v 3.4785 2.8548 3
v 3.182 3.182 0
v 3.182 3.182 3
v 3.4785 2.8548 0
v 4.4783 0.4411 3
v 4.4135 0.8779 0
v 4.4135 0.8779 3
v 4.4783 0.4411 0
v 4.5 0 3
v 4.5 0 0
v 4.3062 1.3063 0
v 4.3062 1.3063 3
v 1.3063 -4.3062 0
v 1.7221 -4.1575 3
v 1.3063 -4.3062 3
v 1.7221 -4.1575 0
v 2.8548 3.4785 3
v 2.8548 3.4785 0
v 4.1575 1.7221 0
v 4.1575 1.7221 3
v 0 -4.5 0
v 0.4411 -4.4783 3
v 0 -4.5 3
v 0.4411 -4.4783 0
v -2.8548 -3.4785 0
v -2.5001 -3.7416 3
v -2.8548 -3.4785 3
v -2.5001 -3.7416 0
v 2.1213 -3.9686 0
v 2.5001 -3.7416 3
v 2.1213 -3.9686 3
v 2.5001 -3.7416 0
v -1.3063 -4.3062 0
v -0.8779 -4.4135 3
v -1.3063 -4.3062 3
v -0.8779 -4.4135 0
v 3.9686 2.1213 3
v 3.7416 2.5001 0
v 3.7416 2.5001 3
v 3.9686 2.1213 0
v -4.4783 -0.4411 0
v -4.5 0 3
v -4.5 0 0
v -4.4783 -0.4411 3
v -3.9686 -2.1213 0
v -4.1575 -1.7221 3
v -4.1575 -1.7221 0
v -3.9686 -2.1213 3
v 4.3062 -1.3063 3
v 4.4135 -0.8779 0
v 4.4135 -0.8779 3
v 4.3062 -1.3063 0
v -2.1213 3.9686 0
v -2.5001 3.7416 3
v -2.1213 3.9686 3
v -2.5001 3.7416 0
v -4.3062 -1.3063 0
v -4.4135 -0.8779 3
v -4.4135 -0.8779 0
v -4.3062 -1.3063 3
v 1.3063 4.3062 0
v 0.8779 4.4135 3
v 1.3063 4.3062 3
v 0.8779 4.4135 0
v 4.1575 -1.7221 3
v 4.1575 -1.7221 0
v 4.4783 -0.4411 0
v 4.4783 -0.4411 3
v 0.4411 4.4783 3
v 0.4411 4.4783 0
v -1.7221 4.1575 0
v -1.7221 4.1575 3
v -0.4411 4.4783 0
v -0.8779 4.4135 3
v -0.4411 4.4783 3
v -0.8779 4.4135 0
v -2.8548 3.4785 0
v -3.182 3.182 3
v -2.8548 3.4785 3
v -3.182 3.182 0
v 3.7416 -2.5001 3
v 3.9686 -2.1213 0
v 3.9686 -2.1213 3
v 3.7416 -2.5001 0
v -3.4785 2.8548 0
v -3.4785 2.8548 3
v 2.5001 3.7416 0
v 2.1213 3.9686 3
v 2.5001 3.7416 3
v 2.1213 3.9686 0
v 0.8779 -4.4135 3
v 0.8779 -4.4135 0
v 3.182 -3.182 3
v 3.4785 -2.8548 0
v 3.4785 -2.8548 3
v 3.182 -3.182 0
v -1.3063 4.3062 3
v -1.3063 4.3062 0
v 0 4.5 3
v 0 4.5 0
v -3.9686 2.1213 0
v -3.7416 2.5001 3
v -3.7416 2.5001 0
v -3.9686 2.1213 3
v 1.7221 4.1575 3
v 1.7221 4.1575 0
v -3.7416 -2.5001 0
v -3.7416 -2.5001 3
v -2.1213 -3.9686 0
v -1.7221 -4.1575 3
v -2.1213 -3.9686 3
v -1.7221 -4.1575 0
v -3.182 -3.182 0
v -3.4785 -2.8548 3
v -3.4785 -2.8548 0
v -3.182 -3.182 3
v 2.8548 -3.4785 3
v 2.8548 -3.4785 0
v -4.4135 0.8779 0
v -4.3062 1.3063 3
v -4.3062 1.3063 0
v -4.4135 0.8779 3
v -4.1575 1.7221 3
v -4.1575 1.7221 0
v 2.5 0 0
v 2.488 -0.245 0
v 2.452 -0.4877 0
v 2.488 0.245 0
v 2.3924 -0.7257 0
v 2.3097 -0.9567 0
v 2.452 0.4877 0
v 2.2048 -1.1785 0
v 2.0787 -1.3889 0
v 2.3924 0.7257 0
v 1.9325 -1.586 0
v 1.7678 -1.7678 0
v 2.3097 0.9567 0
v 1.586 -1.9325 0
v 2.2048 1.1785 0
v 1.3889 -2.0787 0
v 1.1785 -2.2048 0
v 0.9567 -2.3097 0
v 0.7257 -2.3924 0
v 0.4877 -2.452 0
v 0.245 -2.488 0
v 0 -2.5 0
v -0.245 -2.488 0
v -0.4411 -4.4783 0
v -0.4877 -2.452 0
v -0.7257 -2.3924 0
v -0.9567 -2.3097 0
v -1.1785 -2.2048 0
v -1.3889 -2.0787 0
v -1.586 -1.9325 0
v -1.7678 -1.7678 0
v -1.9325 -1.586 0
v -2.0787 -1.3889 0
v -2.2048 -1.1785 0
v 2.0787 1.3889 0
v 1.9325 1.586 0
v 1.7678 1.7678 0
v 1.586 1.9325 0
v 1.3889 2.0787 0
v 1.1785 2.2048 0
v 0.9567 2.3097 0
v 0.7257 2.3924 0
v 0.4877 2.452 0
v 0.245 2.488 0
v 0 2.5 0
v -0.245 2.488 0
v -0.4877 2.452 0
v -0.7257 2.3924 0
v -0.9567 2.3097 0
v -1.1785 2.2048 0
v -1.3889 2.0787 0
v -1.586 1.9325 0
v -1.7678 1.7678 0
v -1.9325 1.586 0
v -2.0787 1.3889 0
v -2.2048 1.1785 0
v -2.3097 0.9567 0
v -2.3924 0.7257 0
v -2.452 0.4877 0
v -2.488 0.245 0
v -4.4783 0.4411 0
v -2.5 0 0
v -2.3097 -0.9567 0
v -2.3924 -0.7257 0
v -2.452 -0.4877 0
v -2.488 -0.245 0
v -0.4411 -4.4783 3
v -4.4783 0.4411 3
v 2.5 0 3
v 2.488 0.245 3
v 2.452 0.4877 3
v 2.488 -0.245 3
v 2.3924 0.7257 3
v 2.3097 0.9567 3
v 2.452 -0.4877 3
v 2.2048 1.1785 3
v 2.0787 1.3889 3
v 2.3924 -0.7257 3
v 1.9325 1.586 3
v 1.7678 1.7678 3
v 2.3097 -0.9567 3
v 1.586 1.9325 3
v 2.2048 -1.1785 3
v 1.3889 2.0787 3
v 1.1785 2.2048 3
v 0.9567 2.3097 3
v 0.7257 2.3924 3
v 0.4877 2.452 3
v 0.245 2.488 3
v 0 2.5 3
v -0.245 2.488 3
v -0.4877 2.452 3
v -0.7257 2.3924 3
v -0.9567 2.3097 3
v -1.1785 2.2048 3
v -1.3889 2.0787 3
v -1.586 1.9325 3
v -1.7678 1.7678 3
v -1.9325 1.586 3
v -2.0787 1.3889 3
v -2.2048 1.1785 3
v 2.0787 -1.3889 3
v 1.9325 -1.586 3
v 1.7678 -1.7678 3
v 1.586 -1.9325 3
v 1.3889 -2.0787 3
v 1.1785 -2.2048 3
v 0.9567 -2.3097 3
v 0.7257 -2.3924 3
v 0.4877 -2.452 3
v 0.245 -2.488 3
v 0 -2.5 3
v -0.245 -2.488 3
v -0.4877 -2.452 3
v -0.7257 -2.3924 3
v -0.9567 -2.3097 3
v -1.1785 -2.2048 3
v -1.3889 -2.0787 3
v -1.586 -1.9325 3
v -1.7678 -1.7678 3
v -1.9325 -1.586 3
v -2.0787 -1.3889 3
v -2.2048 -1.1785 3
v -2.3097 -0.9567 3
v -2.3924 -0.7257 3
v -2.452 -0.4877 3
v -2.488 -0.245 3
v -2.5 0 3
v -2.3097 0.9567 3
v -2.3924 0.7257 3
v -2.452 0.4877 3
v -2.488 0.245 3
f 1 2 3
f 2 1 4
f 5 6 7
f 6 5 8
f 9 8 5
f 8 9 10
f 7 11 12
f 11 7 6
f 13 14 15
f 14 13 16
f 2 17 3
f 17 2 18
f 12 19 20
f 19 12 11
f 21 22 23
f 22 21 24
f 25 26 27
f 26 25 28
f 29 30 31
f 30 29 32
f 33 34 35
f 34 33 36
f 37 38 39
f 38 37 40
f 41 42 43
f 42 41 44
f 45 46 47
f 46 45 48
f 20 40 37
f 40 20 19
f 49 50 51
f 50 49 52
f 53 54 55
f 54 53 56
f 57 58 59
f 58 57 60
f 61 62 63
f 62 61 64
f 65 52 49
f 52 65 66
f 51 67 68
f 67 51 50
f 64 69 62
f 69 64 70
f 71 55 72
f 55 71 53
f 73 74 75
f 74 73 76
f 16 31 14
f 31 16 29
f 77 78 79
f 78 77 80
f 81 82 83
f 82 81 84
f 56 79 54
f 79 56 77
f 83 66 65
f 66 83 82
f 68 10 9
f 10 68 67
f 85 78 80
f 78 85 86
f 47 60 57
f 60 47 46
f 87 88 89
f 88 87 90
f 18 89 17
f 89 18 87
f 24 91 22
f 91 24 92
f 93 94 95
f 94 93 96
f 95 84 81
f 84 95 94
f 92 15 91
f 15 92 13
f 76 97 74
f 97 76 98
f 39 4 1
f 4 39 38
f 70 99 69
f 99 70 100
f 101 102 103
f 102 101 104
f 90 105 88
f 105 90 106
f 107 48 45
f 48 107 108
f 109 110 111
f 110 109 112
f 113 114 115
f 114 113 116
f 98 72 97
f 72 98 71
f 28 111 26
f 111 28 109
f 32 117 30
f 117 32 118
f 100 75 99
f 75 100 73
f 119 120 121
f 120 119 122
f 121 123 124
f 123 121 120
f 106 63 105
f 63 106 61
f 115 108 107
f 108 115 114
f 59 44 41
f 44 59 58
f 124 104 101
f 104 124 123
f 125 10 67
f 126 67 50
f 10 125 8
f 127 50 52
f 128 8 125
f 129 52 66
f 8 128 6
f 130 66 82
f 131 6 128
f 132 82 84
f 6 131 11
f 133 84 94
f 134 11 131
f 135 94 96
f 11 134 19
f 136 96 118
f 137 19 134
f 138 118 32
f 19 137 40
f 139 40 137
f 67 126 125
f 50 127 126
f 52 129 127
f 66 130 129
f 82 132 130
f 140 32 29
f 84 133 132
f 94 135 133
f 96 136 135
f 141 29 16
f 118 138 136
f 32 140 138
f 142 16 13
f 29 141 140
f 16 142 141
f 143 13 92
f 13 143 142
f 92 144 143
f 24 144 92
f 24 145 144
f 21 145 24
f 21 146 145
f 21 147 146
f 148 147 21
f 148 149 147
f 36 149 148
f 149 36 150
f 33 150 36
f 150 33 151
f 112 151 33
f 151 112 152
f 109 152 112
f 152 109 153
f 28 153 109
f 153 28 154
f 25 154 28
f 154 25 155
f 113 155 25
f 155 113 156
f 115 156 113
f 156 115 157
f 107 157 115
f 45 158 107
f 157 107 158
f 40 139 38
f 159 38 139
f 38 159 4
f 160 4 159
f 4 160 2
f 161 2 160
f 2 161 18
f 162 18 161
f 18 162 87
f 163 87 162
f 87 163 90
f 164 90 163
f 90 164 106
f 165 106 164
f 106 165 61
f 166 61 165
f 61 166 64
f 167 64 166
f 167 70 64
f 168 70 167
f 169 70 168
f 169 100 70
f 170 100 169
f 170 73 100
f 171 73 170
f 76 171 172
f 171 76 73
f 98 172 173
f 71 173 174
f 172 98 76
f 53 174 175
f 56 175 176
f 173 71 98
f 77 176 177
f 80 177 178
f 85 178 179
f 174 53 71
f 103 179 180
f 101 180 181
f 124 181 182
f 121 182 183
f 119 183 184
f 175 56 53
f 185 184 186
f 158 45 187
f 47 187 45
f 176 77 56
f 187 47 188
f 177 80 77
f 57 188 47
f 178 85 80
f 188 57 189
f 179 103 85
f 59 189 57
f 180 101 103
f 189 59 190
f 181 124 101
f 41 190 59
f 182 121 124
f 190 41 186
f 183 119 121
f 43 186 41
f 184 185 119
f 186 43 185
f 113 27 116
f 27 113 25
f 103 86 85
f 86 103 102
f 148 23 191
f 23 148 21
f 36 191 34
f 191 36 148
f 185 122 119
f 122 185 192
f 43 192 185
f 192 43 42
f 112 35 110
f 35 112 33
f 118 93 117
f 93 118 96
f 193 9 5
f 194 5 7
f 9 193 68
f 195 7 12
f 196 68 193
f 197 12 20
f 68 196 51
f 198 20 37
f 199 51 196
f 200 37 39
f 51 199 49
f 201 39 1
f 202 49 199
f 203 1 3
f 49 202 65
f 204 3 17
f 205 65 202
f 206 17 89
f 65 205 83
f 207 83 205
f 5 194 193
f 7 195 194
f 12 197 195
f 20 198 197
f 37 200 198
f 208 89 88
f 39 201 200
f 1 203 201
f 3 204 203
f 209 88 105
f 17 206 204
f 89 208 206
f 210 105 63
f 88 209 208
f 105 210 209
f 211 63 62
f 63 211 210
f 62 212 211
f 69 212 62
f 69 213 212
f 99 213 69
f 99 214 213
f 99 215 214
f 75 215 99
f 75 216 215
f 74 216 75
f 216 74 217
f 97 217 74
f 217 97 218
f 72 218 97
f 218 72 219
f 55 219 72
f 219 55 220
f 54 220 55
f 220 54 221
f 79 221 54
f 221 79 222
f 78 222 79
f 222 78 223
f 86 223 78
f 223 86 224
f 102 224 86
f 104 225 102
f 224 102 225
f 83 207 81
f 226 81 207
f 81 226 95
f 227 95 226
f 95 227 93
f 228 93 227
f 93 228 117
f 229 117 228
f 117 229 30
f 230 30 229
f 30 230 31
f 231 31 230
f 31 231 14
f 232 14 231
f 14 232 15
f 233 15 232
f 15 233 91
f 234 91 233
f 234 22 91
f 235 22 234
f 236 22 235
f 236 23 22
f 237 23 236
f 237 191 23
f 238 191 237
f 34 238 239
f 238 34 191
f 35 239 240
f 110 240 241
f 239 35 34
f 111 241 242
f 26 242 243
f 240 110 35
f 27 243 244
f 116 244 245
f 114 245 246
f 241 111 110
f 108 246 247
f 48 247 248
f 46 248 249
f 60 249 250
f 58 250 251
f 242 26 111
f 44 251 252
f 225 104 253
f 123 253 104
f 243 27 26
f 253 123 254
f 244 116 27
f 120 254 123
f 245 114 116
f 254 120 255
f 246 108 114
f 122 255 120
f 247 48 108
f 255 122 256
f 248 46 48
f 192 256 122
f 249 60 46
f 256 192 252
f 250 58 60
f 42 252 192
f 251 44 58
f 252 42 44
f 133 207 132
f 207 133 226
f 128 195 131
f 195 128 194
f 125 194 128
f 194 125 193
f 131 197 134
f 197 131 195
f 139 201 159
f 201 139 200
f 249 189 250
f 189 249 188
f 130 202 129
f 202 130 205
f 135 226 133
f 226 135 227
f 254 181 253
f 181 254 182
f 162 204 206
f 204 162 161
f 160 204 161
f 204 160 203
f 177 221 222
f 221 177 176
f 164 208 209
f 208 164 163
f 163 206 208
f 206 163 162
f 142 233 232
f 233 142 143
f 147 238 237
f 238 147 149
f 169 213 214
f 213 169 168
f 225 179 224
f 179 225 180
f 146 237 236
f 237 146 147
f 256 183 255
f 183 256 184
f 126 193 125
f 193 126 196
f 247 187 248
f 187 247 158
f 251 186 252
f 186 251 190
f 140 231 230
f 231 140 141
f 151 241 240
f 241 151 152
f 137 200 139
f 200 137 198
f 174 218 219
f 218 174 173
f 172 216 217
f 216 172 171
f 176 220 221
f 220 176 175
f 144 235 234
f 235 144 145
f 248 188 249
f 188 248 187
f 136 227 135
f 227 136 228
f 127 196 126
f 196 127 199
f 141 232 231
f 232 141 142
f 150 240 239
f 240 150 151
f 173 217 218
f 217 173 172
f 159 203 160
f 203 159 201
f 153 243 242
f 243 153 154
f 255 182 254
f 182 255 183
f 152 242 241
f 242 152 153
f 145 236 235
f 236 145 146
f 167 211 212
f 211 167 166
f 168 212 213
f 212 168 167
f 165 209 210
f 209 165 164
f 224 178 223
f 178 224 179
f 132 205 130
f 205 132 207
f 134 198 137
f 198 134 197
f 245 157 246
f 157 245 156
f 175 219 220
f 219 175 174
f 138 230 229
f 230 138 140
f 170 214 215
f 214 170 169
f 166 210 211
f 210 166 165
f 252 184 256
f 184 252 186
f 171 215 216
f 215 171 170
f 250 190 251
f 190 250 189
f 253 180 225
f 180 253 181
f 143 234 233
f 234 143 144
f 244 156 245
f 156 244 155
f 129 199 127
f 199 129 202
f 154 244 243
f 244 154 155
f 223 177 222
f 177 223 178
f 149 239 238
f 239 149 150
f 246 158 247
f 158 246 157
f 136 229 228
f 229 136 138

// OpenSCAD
module ball_bearing() {
    difference() {
        // Outer cylinder
        cylinder(d=9.0, h=3.0, $fn=64);
        // Inner bore
        translate([0, 0, -1])
            cylinder(d=5.0, h=5.0, $fn=64);
    }
}

ball_bearing();
